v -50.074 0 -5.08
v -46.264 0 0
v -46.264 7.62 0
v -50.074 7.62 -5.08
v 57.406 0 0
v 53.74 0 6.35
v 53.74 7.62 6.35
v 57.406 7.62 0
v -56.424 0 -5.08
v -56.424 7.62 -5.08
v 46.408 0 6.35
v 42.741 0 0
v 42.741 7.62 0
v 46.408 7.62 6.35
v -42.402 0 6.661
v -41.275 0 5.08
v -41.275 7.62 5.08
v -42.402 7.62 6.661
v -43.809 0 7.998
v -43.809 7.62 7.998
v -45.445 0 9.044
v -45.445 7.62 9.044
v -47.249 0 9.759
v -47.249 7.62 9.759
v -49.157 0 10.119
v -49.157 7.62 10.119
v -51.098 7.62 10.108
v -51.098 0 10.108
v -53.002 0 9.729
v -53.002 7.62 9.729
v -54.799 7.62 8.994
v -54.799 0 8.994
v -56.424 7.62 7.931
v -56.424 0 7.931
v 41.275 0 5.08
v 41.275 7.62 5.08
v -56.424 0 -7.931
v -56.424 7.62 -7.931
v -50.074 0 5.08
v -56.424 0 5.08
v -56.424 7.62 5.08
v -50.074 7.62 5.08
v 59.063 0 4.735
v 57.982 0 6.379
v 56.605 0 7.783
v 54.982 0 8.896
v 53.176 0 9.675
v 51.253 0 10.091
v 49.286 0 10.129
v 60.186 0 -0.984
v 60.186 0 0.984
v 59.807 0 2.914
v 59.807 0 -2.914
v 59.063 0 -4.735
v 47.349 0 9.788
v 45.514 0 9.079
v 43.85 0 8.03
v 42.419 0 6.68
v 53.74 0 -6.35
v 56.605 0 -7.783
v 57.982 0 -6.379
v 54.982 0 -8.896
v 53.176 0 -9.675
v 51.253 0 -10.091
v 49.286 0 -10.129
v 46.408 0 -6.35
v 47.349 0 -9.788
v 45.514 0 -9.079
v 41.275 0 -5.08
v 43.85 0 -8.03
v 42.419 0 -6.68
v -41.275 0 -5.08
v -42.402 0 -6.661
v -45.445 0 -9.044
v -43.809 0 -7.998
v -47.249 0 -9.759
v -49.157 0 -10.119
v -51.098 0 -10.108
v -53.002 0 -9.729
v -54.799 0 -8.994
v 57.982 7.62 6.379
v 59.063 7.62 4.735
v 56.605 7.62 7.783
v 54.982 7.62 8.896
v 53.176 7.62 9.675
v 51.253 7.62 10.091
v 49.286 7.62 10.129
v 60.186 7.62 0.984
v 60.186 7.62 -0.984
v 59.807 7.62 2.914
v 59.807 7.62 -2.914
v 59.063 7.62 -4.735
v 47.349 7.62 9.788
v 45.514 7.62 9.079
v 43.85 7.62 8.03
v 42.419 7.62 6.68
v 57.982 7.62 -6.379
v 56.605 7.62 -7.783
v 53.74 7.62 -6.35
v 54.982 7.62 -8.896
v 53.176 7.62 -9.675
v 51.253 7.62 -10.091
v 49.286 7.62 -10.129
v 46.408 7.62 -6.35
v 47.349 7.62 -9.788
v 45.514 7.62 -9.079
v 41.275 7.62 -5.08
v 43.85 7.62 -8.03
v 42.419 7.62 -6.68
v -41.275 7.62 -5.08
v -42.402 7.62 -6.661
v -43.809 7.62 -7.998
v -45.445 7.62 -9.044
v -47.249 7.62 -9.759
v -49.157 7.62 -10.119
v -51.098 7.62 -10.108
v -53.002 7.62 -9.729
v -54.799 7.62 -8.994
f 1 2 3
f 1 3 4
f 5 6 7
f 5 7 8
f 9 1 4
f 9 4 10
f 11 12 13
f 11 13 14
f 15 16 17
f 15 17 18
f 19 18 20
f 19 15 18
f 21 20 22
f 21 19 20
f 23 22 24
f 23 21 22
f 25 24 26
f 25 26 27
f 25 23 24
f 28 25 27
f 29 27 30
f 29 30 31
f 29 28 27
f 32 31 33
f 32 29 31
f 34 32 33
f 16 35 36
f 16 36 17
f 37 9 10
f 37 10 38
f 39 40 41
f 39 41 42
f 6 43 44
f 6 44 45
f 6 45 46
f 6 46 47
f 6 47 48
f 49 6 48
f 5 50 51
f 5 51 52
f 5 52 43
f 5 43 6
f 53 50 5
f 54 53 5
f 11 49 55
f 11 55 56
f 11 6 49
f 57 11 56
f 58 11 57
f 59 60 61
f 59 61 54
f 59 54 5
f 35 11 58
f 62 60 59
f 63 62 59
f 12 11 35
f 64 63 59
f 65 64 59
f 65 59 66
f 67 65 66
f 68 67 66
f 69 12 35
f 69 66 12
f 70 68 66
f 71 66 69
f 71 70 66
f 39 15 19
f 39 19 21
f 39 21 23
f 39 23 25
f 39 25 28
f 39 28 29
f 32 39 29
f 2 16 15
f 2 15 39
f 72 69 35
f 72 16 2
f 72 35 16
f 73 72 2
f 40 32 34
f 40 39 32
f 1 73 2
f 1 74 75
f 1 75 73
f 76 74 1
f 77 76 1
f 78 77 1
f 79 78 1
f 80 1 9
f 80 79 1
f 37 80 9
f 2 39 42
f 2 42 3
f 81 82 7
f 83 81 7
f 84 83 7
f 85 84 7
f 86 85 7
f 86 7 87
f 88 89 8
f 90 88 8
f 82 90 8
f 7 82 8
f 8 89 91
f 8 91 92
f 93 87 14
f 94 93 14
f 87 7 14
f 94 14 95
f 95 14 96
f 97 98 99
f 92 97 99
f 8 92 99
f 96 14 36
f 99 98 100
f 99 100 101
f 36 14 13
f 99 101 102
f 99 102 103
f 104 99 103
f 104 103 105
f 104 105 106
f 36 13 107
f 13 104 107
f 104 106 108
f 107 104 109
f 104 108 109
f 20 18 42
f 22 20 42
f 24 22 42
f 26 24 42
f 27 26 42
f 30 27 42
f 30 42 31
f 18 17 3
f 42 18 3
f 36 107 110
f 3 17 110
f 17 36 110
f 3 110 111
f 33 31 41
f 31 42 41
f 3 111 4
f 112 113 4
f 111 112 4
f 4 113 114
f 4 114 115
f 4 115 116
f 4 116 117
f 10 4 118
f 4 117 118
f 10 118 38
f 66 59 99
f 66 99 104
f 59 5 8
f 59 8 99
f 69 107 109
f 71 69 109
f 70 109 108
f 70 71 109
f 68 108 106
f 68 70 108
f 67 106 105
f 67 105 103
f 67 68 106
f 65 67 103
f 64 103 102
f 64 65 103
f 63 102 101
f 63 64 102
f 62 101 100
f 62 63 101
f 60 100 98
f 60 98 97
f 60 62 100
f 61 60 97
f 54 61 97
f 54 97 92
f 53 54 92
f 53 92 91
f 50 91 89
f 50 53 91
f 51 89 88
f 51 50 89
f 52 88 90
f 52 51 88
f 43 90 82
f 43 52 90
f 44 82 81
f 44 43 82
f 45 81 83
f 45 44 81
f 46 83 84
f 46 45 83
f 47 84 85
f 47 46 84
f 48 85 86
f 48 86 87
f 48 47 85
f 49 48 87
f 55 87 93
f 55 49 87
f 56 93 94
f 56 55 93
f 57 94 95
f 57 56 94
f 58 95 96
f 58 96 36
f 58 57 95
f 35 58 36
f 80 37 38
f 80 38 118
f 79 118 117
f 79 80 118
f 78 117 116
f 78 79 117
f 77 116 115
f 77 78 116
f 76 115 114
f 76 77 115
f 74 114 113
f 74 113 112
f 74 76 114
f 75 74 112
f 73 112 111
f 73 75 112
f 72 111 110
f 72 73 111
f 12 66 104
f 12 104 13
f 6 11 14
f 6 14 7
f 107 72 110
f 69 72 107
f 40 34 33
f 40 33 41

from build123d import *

# Parameters (mm, degrees)
BOSS_EXTRUDE1_DEPTH = 7.62


with BuildPart() as part:
    # Sketch2 → Boss-Extrude1 (new body)
    with BuildSketch(Plane(origin=(0, 0, 0), x_dir=(1, 0, 0), z_dir=(0, 1, 0))):
        with BuildLine():
            Line((-41.275, 5.08), (41.275, 5.08))
            ThreePointArc((41.275, 5.08), (60.233818102, 0), (41.275, -5.08))
            Line((41.275, -5.08), (-41.275, -5.08))
            ThreePointArc((-41.275, -5.08), (-48.194606038, -9.984696391), (-56.423818102, -7.931147458))
            Line((-56.423818102, -7.931147458), (-56.423818102, -5.08))
            Line((-56.423818102, -5.08), (-50.073818102, -5.08))
            Line((-50.073818102, -5.08), (-46.263818102, 0))
            Line((-46.263818102, 0), (-50.073818102, 5.08))
            Line((-50.073818102, 5.08), (-56.423818102, 5.08))
            Line((-56.423818102, 5.08), (-56.423818102, 7.931147458))
            ThreePointArc((-56.423818102, 7.931147458), (-48.194606038, 9.984696391), (-41.275, 5.08))
        make_face()
        Polygon((53.739992312, -6.35), (57.406166521, 0), (53.739992312, 6.35), (46.407643893, 6.35), (42.741469684, 0), (46.407643893, -6.35), align=None, mode=Mode.SUBTRACT)
    extrude(amount=BOSS_EXTRUDE1_DEPTH)


solid = part.part
